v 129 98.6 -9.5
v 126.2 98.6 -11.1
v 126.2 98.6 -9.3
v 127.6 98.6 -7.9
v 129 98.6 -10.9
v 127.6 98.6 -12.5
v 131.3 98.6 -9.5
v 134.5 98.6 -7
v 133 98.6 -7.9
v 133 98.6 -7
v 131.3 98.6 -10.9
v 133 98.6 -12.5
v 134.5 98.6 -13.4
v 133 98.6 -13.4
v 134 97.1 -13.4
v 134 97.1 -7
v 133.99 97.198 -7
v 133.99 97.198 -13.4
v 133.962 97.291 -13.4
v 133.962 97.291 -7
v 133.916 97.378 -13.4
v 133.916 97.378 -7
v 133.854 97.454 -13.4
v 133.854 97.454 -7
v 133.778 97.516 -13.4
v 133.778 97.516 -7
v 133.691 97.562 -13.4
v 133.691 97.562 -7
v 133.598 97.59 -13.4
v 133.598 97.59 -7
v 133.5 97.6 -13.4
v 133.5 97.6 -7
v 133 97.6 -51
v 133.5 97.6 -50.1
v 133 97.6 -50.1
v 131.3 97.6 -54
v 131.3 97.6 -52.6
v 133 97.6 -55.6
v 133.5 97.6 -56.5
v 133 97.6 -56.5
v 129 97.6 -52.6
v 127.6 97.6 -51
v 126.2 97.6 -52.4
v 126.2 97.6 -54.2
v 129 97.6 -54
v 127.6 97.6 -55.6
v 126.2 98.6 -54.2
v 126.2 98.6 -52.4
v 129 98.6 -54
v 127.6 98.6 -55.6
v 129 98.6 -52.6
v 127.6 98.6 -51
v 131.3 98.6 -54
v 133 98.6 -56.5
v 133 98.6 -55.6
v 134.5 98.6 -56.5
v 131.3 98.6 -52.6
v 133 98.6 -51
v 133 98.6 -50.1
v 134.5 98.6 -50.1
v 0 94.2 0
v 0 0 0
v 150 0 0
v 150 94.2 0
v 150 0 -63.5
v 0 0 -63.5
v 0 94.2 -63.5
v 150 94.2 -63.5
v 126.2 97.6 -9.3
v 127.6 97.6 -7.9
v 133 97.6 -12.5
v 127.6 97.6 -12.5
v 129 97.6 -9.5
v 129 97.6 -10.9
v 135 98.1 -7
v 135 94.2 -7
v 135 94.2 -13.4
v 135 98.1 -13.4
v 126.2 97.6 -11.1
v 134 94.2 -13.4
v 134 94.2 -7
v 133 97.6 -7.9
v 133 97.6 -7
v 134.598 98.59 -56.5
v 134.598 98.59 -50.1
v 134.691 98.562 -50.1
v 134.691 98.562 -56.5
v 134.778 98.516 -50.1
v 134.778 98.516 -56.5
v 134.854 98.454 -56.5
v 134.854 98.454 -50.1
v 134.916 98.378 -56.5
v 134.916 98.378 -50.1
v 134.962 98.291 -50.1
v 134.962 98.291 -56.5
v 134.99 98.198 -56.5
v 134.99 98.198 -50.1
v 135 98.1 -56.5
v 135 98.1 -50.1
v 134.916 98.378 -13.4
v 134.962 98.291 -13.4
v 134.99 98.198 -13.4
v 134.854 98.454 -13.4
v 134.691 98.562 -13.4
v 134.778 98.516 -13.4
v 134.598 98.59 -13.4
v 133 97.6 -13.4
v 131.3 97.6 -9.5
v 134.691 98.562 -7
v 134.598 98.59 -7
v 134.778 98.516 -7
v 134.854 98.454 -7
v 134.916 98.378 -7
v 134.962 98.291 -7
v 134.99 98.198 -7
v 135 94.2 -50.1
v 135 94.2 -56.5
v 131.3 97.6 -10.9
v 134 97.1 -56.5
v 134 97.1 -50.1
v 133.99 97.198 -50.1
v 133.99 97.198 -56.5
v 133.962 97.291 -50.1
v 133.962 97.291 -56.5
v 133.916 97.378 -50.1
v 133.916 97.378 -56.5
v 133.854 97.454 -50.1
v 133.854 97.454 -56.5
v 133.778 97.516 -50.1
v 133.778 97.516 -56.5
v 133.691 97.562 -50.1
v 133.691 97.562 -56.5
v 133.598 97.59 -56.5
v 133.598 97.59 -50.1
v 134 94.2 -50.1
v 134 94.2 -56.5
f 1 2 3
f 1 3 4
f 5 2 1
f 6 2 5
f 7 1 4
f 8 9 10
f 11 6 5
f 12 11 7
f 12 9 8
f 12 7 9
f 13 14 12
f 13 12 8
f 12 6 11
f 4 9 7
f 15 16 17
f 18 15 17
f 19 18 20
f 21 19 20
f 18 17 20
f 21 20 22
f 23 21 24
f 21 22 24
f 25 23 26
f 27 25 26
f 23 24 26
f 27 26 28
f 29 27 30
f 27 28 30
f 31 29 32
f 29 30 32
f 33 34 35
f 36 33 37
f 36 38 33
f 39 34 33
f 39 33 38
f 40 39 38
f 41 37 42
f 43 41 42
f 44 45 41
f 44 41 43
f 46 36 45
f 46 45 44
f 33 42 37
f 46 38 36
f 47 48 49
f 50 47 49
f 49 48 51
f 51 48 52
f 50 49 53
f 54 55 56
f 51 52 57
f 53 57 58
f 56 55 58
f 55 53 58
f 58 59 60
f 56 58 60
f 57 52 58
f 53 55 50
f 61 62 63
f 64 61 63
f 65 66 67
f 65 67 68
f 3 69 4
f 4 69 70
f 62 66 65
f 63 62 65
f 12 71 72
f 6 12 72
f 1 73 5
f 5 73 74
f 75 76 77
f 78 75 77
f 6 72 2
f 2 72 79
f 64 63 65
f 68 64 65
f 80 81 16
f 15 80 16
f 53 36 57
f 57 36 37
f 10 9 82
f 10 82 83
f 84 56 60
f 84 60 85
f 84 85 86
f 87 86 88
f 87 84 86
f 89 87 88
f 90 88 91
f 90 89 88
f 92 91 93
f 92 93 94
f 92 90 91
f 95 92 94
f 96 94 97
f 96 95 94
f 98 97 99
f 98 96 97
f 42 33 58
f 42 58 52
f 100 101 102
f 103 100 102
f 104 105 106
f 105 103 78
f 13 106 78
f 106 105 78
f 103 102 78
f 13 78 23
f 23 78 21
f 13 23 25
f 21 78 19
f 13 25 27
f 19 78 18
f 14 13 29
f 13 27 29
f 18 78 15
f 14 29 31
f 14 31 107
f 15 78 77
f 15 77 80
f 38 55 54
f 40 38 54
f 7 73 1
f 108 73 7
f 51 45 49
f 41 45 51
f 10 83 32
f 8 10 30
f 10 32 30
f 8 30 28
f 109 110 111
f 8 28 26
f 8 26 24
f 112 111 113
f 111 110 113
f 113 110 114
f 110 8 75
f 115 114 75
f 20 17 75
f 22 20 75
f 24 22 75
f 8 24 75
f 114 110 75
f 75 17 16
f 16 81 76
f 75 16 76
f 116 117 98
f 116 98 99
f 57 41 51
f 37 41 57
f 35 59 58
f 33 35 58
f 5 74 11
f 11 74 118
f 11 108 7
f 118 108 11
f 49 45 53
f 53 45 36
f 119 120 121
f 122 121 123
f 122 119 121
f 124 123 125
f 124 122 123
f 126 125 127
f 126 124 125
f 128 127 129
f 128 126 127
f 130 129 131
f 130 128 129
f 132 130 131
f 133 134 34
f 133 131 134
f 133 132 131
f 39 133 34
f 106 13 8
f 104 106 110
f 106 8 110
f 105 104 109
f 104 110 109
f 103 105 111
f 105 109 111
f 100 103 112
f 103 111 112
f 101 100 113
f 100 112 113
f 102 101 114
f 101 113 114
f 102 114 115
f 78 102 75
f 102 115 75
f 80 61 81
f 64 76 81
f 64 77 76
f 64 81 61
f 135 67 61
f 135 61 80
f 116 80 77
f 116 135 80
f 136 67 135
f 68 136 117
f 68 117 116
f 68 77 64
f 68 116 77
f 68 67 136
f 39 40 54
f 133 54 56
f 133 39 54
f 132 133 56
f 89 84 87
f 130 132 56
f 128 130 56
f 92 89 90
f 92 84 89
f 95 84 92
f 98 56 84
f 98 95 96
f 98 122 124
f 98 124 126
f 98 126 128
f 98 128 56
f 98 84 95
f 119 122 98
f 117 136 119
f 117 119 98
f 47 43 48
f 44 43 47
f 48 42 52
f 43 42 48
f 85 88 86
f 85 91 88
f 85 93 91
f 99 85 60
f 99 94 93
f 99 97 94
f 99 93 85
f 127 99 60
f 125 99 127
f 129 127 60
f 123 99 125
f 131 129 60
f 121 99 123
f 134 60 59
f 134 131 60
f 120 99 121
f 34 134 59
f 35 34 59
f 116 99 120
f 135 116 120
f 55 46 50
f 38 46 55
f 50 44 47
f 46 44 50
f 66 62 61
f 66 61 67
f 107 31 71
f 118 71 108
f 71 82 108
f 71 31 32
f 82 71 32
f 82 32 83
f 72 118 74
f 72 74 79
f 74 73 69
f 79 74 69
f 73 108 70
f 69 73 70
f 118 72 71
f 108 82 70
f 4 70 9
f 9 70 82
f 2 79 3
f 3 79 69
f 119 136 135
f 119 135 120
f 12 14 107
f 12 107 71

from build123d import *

# Parameters (mm, degrees)
SKETCH1_W           = 150
SKETCH1_H           = 63.5
BOSS_EXTRUDE1_DEPTH = 94.2
SKETCH3_W           = 2.3
SKETCH3_H           = 1.4
BOSS_EXTRUDE2_DEPTH = 4.4
SKETCH4_W           = 6.8
SKETCH4_H           = 3.4
CUT_EXTRUDE1_DEPTH  = 189.186636082


with BuildPart() as part:
    # Sketch1 → Boss-Extrude1 (new body)
    with BuildSketch(Plane(origin=(0, 0, 0), x_dir=(1, 0, 0), z_dir=(0, 1, 0))):
        with Locations((75, 31.75)):
            Rectangle(SKETCH1_W, SKETCH1_H)
    extrude(amount=BOSS_EXTRUDE1_DEPTH)

    # Sketch3 → Boss-Extrude2 (add)
    with BuildSketch(Plane(origin=(0, 94.2, 0), x_dir=(1, 0, 0), z_dir=(0, 1, 0))):
        Polygon((135, 7), (135, 13.4), (133, 13.4), (133, 12.5), (127.6, 12.5), (126.2, 11.1), (126.2, 9.3), (127.6, 7.9), (133, 7.9), (133, 7), align=None)
        with Locations((130.15, 10.2)):
            Rectangle(SKETCH3_W, SKETCH3_H, mode=Mode.SUBTRACT)
    boss_extrude2 = extrude(amount=BOSS_EXTRUDE2_DEPTH)

    # Sketch4 → Cut-Extrude1 (cut, through all)
    with BuildSketch(Plane.XY.offset(-7)):
        with Locations((129.6, 95.9)):
            Rectangle(SKETCH4_W, SKETCH4_H)
        with BuildLine():
            Line((133, 94.2), (134, 94.2))
            Line((134, 94.2), (134, 97.1))
            ThreePointArc((134, 97.1), (133.853553391, 97.453553391), (133.5, 97.6))
            Line((133.5, 97.6), (133, 97.6))
            Line((133, 97.6), (133, 94.2))
        make_face()
        with BuildLine():
            ThreePointArc((134.5, 98.6), (134.853553391, 98.453553391), (135, 98.1))
            Line((135, 98.1), (135, 98.6))
            Line((135, 98.6), (134.5, 98.6))
        make_face()
    cut_extrude1 = extrude(amount=-CUT_EXTRUDE1_DEPTH, mode=Mode.SUBTRACT)

    # Mirror1: Boss-Extrude2, Cut-Extrude1 across plane
    add(boss_extrude2.mirror(Plane.XY.offset(-31.75)))
    add(cut_extrude1.mirror(Plane.XY.offset(-31.75)), mode=Mode.SUBTRACT)


solid = part.part
